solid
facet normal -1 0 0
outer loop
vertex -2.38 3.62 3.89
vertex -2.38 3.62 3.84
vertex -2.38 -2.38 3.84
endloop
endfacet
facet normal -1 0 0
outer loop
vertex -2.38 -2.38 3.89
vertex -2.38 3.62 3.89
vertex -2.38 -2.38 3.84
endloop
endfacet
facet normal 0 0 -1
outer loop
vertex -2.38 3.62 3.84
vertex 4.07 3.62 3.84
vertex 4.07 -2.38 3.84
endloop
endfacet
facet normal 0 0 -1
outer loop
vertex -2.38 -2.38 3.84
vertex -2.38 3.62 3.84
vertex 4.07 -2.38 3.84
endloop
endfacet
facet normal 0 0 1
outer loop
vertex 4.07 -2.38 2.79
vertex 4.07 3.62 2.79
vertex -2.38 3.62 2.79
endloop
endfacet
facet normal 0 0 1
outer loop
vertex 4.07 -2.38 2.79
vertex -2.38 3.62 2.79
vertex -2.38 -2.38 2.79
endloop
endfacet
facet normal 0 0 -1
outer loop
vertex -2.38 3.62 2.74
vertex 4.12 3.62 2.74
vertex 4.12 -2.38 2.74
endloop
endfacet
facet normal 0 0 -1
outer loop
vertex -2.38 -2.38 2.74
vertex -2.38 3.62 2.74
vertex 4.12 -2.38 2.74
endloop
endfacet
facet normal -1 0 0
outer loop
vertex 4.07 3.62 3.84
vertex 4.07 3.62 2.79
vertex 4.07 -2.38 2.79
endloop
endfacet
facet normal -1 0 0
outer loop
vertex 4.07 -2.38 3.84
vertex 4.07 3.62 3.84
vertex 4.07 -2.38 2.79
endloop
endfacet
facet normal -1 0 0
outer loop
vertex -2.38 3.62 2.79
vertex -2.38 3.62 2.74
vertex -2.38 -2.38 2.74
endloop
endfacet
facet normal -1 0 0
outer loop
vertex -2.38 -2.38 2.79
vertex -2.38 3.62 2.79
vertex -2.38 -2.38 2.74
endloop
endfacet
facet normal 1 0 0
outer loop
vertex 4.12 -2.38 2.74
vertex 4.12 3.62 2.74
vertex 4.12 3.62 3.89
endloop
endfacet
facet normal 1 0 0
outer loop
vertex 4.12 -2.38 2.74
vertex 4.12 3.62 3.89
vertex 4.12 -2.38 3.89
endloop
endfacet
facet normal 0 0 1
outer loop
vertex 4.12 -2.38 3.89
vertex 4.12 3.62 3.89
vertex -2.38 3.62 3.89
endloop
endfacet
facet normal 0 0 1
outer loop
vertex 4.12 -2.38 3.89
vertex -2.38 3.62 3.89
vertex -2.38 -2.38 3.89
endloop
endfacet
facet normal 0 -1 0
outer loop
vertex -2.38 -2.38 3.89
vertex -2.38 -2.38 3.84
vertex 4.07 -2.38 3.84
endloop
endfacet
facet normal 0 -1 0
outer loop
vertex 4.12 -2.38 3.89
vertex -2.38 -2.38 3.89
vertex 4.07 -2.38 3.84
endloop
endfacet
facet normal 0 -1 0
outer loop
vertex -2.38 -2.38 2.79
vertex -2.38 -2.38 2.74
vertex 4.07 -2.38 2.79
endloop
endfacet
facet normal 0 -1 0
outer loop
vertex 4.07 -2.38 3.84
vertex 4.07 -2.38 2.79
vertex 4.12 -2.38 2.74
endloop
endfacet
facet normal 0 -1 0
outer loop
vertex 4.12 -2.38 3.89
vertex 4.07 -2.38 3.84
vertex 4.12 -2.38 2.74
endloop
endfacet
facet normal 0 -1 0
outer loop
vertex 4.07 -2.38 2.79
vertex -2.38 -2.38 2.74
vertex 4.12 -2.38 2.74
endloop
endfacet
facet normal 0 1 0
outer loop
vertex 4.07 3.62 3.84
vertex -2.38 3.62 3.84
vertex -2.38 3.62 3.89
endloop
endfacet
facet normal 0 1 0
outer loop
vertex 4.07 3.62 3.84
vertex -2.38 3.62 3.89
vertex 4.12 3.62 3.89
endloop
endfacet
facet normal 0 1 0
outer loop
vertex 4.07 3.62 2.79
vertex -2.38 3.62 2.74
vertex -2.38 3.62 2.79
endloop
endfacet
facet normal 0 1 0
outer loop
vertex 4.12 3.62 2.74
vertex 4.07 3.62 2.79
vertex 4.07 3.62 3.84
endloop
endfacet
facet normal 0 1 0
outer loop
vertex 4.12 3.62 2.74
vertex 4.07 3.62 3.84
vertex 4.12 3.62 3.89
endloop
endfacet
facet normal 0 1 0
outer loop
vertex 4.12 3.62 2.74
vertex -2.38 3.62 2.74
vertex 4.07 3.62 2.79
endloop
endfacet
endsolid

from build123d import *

# Parameters (mm, degrees)
BOX058_W               = 6
BOX058_H               = 6.45
BOX058_DEPTH           = 1.05
BOX057_W               = 6
BOX057_H               = 6.5
BOX057_DEPTH           = 1.15
CUT009_PLACEMENT_ANGLE = 270


with BuildPart() as small_cu_gnd_electrode014:
    # Box058 → Box058 (new body)
    with BuildSketch(Plane.XY.offset(0.05)):
        with Locations((3, 3.225)):
            Rectangle(BOX058_W, BOX058_H)
    extrude(amount=BOX058_DEPTH)


with BuildPart() as small_cu_electrode002_short_axis_gnd:
    # Box057 → Box057 (new body)
    with BuildSketch(Plane.XY):
        with Locations((3, 3.25)):
            Rectangle(BOX057_W, BOX057_H)
    extrude(amount=BOX057_DEPTH)

    # Cut009: cut Small Cu GND Electrode014
    add(small_cu_gnd_electrode014.part, mode=Mode.SUBTRACT)


with BuildPart() as small_cu_electrode002_short_axis_gnd_1:
    # Cut009 placement: moved
    add(small_cu_electrode002_short_axis_gnd.part.moved(Location((-2.38, 3.62, 2.74))).rotate(Axis((-2.38, 3.62, 2.74), (0, 0, 1)), CUT009_PLACEMENT_ANGLE))


solid = small_cu_electrode002_short_axis_gnd_1.part
